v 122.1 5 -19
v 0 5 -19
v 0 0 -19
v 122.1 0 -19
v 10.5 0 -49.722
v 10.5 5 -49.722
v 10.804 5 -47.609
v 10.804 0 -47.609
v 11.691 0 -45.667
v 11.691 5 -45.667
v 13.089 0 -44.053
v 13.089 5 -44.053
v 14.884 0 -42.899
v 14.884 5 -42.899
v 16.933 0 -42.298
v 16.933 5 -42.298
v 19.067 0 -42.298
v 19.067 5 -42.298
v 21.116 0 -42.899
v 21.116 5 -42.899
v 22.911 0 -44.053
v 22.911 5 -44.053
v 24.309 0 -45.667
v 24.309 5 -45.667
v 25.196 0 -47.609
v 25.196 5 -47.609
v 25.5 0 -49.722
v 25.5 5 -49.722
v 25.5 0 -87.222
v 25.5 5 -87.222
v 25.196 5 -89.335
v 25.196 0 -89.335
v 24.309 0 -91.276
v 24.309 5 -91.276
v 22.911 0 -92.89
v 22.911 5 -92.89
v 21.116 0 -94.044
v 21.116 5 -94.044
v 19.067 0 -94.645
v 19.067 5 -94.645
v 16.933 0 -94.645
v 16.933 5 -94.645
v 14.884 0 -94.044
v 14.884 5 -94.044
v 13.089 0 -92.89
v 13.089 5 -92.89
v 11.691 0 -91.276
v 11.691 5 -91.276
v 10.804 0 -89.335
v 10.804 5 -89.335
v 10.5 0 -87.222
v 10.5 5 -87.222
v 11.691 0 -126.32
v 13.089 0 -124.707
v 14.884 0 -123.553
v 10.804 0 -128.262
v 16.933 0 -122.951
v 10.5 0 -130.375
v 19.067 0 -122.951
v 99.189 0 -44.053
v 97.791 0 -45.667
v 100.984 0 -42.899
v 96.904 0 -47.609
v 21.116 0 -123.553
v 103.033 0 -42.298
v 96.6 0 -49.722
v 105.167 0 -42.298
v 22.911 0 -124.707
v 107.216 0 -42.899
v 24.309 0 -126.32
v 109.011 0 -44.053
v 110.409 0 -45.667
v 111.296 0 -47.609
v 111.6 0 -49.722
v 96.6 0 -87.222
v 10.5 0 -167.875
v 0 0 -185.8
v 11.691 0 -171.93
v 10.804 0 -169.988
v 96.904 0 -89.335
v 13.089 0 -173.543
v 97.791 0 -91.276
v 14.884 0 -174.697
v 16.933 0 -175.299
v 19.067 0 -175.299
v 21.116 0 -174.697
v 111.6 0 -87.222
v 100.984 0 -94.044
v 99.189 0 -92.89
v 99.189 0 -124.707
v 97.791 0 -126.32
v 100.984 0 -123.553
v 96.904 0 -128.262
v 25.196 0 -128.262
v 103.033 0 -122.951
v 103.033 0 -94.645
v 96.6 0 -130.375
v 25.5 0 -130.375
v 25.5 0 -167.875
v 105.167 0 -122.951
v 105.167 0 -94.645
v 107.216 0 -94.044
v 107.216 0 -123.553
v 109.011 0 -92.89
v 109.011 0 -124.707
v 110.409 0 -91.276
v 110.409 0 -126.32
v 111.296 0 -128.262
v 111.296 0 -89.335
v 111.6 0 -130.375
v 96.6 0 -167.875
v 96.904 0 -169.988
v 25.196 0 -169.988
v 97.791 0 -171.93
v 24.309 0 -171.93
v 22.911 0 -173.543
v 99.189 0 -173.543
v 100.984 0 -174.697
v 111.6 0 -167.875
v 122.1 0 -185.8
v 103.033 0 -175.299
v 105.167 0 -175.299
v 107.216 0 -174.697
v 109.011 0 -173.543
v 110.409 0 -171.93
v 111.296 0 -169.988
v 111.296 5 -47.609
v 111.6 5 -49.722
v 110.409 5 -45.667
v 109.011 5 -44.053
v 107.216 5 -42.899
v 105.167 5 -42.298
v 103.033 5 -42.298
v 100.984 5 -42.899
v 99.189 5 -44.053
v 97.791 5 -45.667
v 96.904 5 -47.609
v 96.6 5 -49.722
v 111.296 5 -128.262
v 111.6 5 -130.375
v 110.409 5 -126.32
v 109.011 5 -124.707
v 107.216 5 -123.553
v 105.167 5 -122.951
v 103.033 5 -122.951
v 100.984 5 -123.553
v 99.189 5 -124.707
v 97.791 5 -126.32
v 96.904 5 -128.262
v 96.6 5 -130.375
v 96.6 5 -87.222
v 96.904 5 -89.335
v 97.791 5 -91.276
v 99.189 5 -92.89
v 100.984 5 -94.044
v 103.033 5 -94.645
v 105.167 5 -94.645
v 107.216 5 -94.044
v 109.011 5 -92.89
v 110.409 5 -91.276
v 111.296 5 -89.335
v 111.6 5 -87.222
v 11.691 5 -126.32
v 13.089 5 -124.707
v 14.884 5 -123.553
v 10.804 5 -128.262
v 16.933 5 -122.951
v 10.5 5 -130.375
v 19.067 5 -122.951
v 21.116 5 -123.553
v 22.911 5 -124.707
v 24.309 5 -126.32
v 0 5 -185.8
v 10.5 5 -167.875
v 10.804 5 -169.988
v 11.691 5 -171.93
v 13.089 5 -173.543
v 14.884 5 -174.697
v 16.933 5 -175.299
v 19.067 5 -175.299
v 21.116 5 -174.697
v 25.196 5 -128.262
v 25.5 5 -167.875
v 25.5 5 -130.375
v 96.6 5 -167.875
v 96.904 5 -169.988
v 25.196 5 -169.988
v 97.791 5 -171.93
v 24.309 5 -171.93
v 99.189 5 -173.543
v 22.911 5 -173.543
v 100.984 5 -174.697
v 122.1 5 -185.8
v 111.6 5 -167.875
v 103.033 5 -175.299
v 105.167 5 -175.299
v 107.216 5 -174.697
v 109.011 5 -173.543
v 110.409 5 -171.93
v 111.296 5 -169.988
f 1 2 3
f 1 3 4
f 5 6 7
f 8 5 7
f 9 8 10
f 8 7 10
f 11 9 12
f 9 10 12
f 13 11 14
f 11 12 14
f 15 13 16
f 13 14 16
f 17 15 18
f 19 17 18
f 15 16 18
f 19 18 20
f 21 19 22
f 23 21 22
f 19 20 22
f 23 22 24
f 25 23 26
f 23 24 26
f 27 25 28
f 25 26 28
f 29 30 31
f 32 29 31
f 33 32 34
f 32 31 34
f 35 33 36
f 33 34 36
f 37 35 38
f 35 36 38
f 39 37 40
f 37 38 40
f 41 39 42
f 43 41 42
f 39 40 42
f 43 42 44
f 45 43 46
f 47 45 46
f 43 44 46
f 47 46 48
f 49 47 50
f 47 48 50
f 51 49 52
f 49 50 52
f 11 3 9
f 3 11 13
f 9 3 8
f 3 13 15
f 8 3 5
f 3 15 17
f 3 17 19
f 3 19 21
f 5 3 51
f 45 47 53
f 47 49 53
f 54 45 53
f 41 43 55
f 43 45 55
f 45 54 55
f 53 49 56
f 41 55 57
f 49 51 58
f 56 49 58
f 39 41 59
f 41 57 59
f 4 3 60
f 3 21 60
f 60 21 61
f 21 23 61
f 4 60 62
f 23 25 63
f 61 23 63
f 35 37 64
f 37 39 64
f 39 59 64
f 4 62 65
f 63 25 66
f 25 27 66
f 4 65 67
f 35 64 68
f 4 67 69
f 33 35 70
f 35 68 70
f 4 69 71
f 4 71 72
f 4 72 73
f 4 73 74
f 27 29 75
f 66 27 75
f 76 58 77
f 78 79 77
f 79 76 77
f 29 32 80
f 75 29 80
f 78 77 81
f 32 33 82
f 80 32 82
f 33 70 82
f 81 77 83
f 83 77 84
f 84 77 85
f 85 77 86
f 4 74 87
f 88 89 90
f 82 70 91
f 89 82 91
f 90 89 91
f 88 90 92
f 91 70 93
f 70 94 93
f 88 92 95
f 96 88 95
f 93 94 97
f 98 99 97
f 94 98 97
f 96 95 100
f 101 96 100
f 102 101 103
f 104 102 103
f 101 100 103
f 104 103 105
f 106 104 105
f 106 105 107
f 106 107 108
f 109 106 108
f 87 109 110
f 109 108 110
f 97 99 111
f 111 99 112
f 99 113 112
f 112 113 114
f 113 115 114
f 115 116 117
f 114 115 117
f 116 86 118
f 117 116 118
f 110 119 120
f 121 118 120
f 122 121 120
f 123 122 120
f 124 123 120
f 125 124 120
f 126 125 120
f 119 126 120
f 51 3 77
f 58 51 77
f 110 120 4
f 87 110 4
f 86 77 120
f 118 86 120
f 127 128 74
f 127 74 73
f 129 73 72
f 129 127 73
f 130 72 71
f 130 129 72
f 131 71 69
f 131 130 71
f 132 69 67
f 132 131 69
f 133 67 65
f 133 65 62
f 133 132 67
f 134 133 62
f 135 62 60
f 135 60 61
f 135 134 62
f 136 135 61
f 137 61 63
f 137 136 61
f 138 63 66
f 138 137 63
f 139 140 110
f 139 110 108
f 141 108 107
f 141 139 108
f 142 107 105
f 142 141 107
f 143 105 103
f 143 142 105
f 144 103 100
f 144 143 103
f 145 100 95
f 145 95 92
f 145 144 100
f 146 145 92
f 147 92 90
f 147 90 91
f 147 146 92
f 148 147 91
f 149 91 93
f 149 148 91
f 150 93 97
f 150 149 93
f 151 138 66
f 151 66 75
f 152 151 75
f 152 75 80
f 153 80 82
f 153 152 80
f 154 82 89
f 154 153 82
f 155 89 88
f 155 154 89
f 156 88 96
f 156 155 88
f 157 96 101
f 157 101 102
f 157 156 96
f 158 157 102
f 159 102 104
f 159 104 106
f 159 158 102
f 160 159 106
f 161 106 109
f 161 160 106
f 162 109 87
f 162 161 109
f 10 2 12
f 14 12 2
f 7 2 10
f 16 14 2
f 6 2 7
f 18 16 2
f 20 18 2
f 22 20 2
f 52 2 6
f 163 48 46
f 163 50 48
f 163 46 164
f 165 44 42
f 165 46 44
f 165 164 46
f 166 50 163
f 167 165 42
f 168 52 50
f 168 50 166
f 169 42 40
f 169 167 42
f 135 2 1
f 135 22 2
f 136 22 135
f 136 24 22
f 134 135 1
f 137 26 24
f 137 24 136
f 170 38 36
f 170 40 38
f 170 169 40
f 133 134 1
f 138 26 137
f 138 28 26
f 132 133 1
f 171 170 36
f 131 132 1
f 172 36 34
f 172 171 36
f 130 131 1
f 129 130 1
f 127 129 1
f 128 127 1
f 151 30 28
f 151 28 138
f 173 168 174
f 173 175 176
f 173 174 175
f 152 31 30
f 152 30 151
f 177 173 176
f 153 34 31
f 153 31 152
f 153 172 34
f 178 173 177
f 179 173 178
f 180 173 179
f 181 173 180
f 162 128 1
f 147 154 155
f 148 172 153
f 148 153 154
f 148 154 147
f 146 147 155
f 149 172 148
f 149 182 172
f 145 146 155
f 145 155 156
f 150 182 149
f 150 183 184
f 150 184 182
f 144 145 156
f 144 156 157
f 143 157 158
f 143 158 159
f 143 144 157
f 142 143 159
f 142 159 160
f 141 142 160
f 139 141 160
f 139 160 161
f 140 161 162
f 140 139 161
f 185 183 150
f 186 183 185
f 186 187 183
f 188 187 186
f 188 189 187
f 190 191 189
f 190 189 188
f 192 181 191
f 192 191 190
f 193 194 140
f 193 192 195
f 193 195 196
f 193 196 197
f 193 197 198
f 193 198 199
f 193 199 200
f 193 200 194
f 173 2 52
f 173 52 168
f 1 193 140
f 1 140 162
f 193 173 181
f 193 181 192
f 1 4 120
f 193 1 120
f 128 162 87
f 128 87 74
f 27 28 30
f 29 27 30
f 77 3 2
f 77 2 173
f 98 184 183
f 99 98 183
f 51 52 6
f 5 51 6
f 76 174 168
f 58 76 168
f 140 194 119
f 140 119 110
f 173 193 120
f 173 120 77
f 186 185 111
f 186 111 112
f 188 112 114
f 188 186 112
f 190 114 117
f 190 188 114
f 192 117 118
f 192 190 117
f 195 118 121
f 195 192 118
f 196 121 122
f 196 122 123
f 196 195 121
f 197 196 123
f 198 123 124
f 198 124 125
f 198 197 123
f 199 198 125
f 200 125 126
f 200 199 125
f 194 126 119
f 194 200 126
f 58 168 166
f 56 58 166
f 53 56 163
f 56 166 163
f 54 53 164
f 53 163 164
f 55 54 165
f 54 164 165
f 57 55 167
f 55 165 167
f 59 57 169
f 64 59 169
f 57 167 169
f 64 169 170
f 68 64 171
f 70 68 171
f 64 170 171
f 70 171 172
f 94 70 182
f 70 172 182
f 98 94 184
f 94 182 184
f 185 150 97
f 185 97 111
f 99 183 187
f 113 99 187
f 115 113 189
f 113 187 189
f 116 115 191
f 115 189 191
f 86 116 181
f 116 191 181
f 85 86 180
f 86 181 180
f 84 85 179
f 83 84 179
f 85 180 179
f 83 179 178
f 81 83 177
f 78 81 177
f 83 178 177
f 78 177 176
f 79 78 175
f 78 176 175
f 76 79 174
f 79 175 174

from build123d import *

# Parameters (mm, degrees)
SKETCH1_W           = 122.1
SKETCH1_H           = 197.8
BOSS_EXTRUDE2_DEPTH = 5
CUT_EXTRUDE1_DEPTH  = 5
SKETCH5_W           = 176.692600263
SKETCH5_H           = 67.834694549
CUT_EXTRUDE2_DEPTH  = 12
SKETCH6_W           = 148.50335492
SKETCH6_H           = 63.858757444
CUT_EXTRUDE3_DEPTH  = 19


with BuildPart() as part:
    # Sketch1 → Boss-Extrude2 (new body)
    with BuildSketch(Plane(origin=(0, 0, 0), x_dir=(1, 0, 0), z_dir=(0, 1, 0))):
        with Locations((61.05, 98.9)):
            Rectangle(SKETCH1_W, SKETCH1_H)
    extrude(amount=BOSS_EXTRUDE2_DEPTH)

    # Sketch3 → Cut-Extrude1 (cut)
    with BuildSketch(Plane(origin=(0, 5, 0), x_dir=(1, 0, 0), z_dir=(0, 1, 0))):
        with BuildLine():
            Line((10.5, 167.875007929), (10.5, 130.375007929))
            ThreePointArc((10.5, 130.375007929), (18, 122.875007929), (25.5, 130.375007929))
            Line((25.5, 130.375007929), (25.5, 167.875007929))
            ThreePointArc((25.5, 167.875007929), (18, 175.375007929), (10.5, 167.875007929))
        make_face()
        with BuildLine():
            ThreePointArc((111.6, 130.375007929), (104.1, 122.875007929), (96.6, 130.375007929))
            Line((96.6, 130.375007929), (96.6, 167.875007929))
            ThreePointArc((96.6, 167.875007929), (104.1, 175.375007929), (111.6, 167.875007929))
            Line((111.6, 167.875007929), (111.6, 130.375007929))
        make_face()
        with BuildLine():
            ThreePointArc((111.6, 49.721568021), (104.1, 42.221568021), (96.6, 49.721568021))
            Line((96.6, 49.721568021), (96.6, 87.221568021))
            ThreePointArc((96.6, 87.221568021), (104.1, 94.721568021), (111.6, 87.221568021))
            Line((111.6, 87.221568021), (111.6, 49.721568021))
        make_face()
        with BuildLine():
            Line((10.5, 87.221568021), (10.5, 49.721568021))
            ThreePointArc((10.5, 49.721568021), (18, 42.221568021), (25.5, 49.721568021))
            Line((25.5, 49.721568021), (25.5, 87.221568021))
            ThreePointArc((25.5, 87.221568021), (18, 94.721568021), (10.5, 87.221568021))
        make_face()
    extrude(amount=-CUT_EXTRUDE1_DEPTH, mode=Mode.SUBTRACT)

    # Sketch5 → Cut-Extrude2 (cut)
    with BuildSketch(Plane(origin=(0, 0, -197.8), x_dir=(-1, 0, 0), z_dir=(0, 0, -1))):
        with Locations((-46.708276043, -7.602787765)):
            Rectangle(SKETCH5_W, SKETCH5_H)
    extrude(amount=-CUT_EXTRUDE2_DEPTH, mode=Mode.SUBTRACT)

    # Sketch6 → Cut-Extrude3 (cut)
    with BuildSketch(Plane.XY):
        with Locations((68.056552209, 0.930489014)):
            Rectangle(SKETCH6_W, SKETCH6_H)
    extrude(amount=-CUT_EXTRUDE3_DEPTH, mode=Mode.SUBTRACT)


solid = part.part
